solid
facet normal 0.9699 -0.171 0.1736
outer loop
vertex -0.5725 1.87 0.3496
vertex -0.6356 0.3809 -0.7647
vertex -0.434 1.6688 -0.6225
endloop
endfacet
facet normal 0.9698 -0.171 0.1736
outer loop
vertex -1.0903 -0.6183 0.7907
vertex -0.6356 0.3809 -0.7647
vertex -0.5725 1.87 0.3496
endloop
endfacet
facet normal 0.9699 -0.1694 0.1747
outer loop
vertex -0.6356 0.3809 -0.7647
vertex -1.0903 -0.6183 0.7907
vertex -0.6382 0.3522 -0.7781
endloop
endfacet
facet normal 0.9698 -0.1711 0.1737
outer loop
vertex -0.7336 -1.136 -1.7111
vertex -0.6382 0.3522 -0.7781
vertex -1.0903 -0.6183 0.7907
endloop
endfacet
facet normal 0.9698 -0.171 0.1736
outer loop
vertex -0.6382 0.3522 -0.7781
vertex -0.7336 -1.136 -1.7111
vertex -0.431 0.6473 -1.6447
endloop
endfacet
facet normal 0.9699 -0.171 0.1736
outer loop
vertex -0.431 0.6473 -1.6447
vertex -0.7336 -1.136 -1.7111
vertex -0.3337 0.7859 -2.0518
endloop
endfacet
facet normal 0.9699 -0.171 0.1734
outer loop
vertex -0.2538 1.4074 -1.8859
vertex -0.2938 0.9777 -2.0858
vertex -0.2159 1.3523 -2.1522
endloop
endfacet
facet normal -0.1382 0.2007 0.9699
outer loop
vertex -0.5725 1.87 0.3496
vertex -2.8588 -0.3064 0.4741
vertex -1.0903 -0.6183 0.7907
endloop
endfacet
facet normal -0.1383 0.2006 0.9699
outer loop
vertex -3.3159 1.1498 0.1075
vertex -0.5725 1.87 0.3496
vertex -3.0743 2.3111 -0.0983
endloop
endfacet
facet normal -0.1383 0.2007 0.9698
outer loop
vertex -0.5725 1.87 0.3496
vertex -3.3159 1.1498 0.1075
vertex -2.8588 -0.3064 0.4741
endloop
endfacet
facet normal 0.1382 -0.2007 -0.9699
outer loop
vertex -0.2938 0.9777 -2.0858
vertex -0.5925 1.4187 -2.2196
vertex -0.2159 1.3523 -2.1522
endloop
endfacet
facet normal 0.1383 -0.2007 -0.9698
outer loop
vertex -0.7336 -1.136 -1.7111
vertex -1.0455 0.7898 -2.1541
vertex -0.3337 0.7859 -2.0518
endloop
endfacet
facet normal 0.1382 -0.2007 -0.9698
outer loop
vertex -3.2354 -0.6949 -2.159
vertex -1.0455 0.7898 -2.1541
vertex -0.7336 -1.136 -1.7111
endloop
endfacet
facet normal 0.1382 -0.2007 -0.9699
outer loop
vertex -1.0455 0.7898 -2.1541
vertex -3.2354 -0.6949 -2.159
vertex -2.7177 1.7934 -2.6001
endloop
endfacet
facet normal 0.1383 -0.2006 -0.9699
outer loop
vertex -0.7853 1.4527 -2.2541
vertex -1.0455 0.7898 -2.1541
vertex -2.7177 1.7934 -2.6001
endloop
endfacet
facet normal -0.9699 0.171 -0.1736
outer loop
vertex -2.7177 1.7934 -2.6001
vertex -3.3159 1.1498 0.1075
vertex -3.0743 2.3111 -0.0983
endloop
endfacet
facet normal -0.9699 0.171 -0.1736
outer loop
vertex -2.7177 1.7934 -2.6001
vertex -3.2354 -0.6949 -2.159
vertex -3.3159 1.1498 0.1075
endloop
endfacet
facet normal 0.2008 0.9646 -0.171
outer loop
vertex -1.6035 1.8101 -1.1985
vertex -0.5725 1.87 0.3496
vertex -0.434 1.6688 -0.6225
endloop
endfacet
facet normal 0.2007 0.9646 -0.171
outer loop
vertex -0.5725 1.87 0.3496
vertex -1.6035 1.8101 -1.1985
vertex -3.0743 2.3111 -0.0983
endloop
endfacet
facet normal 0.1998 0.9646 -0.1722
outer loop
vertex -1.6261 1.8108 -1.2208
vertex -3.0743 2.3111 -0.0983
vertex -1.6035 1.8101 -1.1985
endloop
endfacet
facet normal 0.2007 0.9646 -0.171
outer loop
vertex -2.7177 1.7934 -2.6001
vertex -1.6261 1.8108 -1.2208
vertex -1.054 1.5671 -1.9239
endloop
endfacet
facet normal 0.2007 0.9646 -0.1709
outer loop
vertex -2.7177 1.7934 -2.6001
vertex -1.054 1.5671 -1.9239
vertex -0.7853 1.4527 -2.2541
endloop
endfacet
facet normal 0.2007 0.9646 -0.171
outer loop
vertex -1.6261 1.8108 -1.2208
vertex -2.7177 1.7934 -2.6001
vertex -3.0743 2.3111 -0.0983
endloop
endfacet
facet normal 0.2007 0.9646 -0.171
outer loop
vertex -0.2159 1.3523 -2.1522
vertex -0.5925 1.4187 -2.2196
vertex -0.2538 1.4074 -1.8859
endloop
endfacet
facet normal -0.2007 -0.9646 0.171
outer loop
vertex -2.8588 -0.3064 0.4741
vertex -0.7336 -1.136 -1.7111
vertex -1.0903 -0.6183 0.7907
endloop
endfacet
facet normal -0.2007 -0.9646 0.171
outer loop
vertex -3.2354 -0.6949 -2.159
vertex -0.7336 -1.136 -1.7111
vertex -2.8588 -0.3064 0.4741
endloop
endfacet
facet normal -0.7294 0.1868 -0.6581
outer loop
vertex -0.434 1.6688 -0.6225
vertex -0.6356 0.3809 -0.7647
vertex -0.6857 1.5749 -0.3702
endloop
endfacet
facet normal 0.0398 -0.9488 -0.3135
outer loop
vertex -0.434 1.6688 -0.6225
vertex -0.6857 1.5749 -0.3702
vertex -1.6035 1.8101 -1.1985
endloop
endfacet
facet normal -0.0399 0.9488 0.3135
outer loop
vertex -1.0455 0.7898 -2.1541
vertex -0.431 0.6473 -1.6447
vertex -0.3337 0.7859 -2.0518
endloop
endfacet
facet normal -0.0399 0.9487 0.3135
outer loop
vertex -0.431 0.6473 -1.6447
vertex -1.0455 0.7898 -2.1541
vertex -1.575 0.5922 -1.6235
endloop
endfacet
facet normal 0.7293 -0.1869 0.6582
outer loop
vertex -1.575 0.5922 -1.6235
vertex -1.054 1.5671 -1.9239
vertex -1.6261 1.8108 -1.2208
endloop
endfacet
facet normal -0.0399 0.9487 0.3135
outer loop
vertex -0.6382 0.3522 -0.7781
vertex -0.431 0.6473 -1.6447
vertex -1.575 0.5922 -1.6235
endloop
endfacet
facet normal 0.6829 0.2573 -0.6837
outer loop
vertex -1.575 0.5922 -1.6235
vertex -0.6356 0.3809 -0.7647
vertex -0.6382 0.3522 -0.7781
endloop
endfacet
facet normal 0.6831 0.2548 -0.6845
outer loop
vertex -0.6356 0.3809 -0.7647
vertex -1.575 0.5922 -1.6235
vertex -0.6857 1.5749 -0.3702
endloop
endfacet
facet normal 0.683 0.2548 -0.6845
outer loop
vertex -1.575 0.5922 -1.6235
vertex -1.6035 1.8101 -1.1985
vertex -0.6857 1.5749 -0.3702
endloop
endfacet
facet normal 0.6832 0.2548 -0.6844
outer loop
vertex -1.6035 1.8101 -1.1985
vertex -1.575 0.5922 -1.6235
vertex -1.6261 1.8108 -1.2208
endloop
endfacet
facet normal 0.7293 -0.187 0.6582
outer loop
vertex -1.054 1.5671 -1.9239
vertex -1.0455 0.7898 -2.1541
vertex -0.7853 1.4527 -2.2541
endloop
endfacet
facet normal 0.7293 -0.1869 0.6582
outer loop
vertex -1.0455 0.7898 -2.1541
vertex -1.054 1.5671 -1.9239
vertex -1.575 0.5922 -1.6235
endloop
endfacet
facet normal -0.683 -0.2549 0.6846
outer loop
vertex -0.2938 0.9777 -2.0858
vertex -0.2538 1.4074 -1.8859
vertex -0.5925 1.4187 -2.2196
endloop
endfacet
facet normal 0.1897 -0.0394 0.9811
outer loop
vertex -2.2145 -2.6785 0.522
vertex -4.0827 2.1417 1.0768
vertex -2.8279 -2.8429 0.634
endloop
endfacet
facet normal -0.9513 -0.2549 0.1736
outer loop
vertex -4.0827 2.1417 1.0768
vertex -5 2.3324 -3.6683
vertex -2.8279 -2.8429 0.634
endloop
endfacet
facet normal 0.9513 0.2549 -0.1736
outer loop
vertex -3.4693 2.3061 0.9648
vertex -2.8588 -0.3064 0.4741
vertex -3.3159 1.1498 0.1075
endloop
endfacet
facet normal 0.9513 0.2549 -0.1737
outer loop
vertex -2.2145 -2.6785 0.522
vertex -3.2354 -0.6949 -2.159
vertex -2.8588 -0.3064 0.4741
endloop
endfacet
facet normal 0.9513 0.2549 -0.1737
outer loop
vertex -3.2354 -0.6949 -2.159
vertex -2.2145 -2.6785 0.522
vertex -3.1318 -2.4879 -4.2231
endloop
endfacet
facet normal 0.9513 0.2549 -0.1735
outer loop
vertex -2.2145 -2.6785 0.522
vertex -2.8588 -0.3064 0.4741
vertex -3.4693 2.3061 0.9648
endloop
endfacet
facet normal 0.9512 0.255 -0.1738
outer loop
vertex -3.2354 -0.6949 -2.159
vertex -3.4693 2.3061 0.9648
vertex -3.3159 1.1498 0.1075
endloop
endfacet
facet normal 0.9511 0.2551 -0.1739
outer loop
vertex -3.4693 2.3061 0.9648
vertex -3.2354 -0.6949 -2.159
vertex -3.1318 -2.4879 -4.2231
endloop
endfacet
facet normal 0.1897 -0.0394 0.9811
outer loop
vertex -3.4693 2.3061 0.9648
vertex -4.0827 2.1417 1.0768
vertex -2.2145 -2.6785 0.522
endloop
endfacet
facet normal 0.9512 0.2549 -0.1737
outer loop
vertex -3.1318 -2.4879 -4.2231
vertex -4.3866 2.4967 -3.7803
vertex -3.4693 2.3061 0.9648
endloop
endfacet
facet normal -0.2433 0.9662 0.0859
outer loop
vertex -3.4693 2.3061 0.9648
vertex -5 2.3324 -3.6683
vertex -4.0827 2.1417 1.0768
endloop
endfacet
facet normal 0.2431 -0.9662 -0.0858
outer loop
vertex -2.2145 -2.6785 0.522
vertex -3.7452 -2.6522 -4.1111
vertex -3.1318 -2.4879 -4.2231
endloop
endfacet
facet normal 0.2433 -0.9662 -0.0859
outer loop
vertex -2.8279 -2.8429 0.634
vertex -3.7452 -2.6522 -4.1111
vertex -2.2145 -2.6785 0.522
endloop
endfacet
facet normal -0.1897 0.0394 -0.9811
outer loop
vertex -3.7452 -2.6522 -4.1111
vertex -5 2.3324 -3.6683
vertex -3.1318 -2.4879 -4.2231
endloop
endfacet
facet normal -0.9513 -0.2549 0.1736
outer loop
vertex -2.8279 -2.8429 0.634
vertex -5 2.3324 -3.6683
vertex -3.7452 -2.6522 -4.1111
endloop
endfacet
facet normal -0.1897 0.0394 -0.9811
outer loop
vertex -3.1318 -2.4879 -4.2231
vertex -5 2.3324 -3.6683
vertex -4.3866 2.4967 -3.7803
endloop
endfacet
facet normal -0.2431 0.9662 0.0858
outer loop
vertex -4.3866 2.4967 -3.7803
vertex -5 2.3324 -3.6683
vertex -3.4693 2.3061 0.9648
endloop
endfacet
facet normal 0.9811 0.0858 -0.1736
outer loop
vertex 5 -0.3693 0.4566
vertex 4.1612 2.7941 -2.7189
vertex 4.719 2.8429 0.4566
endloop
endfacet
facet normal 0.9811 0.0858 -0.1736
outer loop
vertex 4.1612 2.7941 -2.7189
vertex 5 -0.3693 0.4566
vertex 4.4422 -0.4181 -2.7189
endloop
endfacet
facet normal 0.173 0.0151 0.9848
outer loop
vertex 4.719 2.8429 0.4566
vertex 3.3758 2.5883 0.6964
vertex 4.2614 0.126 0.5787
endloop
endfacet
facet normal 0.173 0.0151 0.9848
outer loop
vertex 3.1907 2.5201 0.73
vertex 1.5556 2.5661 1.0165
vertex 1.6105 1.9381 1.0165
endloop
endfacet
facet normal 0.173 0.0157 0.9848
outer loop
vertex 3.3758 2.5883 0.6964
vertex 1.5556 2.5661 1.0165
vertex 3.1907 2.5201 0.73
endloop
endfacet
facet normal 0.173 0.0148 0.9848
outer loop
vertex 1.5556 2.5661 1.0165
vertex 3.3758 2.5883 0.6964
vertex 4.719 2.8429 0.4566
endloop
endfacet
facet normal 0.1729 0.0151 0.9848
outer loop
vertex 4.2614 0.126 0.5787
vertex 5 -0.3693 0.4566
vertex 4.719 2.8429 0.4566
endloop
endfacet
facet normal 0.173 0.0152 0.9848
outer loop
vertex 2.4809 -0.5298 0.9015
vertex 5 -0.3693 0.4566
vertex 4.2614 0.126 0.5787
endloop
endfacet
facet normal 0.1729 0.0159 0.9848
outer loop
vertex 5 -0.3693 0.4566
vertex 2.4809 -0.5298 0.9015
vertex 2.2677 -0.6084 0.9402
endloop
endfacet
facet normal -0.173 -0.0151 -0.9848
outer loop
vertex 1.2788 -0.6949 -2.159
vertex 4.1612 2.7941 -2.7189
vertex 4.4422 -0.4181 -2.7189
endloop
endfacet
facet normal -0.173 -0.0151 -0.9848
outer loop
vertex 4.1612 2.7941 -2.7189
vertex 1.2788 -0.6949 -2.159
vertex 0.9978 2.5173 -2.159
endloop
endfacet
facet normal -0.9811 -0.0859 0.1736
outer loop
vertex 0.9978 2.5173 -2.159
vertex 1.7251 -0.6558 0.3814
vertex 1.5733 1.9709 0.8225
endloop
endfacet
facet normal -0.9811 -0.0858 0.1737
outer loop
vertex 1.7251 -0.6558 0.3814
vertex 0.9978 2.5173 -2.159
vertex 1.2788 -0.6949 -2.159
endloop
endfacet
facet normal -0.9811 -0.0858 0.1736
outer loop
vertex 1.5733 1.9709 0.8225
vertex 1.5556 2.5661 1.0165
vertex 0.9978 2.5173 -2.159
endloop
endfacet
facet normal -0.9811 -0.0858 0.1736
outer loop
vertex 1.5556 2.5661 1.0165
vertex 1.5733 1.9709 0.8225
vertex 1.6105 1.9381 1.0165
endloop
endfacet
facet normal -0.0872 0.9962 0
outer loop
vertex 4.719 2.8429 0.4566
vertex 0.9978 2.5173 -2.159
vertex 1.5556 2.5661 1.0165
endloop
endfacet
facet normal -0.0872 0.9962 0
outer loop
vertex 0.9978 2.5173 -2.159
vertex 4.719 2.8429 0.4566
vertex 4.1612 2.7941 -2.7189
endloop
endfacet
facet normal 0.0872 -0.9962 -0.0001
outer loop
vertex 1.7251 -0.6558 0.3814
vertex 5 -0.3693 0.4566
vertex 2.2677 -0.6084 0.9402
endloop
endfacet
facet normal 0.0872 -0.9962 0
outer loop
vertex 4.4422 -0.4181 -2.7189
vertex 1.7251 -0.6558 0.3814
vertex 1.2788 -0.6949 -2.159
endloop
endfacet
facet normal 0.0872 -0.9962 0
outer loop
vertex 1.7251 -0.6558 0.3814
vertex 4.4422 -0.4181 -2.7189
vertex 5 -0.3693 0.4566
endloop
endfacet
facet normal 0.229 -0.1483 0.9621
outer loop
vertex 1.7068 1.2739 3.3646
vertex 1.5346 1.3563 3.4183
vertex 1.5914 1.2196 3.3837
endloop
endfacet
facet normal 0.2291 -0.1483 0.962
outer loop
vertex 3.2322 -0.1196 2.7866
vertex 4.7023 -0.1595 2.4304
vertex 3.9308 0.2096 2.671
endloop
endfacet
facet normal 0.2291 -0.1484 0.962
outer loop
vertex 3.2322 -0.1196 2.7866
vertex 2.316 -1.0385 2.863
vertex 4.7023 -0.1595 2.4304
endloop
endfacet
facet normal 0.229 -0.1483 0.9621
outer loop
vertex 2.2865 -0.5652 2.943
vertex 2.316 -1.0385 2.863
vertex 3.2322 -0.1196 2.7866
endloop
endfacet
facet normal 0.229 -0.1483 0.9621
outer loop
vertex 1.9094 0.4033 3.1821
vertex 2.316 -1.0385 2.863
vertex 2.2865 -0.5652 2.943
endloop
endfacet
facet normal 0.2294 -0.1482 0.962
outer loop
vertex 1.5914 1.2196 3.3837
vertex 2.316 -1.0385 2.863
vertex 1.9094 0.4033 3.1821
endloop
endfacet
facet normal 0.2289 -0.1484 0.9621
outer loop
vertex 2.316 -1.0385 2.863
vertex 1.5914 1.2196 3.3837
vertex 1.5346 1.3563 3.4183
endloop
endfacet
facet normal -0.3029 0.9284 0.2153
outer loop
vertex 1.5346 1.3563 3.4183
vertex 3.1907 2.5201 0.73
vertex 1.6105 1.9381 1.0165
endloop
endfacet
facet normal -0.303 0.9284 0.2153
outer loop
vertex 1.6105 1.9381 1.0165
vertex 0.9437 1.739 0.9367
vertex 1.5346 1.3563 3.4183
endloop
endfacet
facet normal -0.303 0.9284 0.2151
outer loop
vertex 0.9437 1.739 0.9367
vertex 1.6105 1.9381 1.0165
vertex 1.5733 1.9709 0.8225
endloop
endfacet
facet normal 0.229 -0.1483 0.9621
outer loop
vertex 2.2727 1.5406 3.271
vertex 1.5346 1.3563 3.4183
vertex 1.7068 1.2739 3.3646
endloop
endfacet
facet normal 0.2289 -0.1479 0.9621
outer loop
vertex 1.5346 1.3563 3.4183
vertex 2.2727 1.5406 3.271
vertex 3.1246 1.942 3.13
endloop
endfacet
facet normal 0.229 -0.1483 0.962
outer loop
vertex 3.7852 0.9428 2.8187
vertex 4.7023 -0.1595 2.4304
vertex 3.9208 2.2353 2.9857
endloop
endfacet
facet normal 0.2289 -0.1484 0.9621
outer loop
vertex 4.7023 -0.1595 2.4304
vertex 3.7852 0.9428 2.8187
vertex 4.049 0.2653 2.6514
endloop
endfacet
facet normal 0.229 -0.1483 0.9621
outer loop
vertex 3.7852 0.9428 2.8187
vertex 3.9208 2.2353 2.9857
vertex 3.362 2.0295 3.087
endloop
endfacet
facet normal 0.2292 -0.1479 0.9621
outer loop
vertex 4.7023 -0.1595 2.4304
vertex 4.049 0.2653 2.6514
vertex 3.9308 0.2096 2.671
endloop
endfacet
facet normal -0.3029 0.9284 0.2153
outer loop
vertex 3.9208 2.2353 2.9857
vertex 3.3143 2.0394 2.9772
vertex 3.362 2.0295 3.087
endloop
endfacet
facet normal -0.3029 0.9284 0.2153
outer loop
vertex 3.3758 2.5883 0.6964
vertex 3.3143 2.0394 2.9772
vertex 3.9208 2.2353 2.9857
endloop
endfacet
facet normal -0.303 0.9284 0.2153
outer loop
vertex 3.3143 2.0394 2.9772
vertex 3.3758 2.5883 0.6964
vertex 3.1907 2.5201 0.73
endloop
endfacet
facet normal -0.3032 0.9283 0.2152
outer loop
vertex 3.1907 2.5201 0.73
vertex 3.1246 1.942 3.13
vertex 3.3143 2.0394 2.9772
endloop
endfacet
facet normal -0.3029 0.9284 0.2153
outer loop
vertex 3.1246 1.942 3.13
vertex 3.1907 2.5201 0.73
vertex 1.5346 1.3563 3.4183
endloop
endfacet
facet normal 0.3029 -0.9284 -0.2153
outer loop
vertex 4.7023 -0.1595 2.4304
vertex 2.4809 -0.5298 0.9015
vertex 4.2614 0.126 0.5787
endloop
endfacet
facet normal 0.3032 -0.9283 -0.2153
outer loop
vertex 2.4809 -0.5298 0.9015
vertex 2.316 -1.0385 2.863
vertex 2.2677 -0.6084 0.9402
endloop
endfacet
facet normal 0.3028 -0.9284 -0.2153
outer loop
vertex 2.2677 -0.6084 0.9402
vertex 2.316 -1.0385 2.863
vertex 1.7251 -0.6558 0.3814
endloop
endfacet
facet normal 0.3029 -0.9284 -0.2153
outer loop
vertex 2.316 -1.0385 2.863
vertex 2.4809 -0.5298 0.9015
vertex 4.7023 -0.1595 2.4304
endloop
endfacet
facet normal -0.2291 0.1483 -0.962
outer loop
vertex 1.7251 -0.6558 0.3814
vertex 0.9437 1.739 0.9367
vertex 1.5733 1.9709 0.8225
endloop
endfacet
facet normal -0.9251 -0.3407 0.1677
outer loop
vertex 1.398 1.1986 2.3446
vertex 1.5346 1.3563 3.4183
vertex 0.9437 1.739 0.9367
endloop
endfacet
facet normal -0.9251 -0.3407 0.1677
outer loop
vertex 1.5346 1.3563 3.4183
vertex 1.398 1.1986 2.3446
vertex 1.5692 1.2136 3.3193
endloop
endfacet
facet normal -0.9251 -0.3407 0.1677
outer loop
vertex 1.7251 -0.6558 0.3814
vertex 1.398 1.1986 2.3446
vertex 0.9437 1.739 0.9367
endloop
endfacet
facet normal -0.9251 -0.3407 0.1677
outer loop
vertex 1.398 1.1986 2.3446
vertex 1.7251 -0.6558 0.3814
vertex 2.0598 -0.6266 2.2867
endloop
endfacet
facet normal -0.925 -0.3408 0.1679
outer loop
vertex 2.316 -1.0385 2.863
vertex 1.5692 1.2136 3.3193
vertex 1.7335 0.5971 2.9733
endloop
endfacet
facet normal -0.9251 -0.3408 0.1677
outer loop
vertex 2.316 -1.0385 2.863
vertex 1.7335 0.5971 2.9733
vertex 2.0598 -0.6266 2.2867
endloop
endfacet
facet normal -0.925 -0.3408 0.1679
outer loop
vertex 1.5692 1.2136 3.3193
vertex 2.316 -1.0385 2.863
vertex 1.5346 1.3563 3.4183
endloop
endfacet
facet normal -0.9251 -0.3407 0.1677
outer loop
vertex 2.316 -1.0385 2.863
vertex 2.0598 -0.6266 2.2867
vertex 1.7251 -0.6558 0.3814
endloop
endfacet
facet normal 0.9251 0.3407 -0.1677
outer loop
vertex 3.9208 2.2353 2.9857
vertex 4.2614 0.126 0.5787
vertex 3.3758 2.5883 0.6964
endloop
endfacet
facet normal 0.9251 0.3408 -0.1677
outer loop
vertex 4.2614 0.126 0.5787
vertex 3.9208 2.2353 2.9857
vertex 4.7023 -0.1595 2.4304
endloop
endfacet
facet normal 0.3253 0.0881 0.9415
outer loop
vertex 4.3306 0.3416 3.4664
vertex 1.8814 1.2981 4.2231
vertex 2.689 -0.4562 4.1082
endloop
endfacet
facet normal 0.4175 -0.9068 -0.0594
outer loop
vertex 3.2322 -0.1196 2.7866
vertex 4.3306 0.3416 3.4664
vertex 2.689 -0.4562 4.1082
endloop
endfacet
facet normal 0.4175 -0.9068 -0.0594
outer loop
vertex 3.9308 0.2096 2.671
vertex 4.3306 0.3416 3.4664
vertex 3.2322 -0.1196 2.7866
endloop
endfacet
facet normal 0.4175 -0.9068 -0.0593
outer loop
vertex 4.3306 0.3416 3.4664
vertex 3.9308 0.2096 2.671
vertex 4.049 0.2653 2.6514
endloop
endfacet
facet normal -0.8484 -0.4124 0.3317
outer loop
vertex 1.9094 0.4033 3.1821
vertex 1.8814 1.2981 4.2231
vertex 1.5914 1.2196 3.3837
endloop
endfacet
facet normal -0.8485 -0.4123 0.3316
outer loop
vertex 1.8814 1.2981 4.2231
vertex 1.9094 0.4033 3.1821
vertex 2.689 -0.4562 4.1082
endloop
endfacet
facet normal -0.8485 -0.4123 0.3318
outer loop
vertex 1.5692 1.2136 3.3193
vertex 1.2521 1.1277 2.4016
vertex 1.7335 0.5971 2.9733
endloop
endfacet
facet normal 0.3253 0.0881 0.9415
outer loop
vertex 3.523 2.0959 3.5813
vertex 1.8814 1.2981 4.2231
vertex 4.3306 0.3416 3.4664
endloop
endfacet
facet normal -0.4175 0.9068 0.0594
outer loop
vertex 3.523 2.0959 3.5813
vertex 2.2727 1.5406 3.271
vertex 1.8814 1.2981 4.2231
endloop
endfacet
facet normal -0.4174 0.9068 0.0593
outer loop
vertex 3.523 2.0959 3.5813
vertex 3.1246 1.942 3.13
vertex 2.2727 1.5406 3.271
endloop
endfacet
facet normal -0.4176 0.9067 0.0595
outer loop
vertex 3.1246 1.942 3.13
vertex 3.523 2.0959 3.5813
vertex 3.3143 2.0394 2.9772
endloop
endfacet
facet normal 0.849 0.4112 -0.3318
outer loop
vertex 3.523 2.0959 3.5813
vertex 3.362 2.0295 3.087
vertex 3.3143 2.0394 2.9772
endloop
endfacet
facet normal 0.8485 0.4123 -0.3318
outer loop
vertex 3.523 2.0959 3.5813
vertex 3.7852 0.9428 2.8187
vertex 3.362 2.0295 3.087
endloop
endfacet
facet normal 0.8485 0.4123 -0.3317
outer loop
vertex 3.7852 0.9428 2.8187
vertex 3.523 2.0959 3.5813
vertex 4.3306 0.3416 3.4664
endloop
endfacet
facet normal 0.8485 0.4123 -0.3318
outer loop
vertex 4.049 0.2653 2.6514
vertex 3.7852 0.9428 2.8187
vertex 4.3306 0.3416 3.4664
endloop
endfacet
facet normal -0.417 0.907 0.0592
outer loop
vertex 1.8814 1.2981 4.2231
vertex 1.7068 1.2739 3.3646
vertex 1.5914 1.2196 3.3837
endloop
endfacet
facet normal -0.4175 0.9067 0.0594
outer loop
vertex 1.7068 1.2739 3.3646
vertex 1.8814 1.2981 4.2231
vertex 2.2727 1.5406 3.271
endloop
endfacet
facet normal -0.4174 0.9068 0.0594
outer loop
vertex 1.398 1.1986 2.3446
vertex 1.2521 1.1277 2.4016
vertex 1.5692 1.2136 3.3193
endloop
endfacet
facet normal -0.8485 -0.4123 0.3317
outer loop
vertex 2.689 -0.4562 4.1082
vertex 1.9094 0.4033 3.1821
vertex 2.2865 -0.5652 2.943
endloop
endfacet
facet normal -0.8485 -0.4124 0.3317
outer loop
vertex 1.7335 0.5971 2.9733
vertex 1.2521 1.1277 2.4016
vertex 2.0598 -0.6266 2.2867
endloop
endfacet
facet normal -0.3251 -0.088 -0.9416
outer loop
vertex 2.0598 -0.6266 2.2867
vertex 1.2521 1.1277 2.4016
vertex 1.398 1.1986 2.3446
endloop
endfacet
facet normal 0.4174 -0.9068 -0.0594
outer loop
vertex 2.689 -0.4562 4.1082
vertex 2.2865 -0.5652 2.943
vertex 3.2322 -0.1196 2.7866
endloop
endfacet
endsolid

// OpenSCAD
translate([-3.235401, -0.694887, -2.158996])
union() {
  union() {
    rotate([5, 10, 15])
    translate([-0.644892, -1.934676, -1.934676])
    cube(size = [0.644892, 5.159137, 4.836691], center = false);
    rotate([-10, -10, -10])
    difference() {
      cube(size = [2.579568, 2.579568, 2.579568], center = false);
      translate([1.483252, 1.483252, 0.548158])
      rotate([45, 45, 45])
      cube(size = [1.289784, 1.289784, 1.289784], center = false);
    }
  }
  translate([4.514245, 0.000000, 0.000000])
  rotate([0, 10, 5])
  union() {
    cube(size = [3.224460, 3.224460, 3.224460], center = false);
    translate([0.000000, 0.000000, 2.579568])
    rotate([10, 0, 15])
    cube(size = [2.579568, 2.579568, 2.579568], center = false);
    translate([0.000000, 0.000000, 4.514245])
    rotate([0, 10, 20])
    cube(size = [1.934676, 1.934676, 1.934676], center = false);
  }
}
